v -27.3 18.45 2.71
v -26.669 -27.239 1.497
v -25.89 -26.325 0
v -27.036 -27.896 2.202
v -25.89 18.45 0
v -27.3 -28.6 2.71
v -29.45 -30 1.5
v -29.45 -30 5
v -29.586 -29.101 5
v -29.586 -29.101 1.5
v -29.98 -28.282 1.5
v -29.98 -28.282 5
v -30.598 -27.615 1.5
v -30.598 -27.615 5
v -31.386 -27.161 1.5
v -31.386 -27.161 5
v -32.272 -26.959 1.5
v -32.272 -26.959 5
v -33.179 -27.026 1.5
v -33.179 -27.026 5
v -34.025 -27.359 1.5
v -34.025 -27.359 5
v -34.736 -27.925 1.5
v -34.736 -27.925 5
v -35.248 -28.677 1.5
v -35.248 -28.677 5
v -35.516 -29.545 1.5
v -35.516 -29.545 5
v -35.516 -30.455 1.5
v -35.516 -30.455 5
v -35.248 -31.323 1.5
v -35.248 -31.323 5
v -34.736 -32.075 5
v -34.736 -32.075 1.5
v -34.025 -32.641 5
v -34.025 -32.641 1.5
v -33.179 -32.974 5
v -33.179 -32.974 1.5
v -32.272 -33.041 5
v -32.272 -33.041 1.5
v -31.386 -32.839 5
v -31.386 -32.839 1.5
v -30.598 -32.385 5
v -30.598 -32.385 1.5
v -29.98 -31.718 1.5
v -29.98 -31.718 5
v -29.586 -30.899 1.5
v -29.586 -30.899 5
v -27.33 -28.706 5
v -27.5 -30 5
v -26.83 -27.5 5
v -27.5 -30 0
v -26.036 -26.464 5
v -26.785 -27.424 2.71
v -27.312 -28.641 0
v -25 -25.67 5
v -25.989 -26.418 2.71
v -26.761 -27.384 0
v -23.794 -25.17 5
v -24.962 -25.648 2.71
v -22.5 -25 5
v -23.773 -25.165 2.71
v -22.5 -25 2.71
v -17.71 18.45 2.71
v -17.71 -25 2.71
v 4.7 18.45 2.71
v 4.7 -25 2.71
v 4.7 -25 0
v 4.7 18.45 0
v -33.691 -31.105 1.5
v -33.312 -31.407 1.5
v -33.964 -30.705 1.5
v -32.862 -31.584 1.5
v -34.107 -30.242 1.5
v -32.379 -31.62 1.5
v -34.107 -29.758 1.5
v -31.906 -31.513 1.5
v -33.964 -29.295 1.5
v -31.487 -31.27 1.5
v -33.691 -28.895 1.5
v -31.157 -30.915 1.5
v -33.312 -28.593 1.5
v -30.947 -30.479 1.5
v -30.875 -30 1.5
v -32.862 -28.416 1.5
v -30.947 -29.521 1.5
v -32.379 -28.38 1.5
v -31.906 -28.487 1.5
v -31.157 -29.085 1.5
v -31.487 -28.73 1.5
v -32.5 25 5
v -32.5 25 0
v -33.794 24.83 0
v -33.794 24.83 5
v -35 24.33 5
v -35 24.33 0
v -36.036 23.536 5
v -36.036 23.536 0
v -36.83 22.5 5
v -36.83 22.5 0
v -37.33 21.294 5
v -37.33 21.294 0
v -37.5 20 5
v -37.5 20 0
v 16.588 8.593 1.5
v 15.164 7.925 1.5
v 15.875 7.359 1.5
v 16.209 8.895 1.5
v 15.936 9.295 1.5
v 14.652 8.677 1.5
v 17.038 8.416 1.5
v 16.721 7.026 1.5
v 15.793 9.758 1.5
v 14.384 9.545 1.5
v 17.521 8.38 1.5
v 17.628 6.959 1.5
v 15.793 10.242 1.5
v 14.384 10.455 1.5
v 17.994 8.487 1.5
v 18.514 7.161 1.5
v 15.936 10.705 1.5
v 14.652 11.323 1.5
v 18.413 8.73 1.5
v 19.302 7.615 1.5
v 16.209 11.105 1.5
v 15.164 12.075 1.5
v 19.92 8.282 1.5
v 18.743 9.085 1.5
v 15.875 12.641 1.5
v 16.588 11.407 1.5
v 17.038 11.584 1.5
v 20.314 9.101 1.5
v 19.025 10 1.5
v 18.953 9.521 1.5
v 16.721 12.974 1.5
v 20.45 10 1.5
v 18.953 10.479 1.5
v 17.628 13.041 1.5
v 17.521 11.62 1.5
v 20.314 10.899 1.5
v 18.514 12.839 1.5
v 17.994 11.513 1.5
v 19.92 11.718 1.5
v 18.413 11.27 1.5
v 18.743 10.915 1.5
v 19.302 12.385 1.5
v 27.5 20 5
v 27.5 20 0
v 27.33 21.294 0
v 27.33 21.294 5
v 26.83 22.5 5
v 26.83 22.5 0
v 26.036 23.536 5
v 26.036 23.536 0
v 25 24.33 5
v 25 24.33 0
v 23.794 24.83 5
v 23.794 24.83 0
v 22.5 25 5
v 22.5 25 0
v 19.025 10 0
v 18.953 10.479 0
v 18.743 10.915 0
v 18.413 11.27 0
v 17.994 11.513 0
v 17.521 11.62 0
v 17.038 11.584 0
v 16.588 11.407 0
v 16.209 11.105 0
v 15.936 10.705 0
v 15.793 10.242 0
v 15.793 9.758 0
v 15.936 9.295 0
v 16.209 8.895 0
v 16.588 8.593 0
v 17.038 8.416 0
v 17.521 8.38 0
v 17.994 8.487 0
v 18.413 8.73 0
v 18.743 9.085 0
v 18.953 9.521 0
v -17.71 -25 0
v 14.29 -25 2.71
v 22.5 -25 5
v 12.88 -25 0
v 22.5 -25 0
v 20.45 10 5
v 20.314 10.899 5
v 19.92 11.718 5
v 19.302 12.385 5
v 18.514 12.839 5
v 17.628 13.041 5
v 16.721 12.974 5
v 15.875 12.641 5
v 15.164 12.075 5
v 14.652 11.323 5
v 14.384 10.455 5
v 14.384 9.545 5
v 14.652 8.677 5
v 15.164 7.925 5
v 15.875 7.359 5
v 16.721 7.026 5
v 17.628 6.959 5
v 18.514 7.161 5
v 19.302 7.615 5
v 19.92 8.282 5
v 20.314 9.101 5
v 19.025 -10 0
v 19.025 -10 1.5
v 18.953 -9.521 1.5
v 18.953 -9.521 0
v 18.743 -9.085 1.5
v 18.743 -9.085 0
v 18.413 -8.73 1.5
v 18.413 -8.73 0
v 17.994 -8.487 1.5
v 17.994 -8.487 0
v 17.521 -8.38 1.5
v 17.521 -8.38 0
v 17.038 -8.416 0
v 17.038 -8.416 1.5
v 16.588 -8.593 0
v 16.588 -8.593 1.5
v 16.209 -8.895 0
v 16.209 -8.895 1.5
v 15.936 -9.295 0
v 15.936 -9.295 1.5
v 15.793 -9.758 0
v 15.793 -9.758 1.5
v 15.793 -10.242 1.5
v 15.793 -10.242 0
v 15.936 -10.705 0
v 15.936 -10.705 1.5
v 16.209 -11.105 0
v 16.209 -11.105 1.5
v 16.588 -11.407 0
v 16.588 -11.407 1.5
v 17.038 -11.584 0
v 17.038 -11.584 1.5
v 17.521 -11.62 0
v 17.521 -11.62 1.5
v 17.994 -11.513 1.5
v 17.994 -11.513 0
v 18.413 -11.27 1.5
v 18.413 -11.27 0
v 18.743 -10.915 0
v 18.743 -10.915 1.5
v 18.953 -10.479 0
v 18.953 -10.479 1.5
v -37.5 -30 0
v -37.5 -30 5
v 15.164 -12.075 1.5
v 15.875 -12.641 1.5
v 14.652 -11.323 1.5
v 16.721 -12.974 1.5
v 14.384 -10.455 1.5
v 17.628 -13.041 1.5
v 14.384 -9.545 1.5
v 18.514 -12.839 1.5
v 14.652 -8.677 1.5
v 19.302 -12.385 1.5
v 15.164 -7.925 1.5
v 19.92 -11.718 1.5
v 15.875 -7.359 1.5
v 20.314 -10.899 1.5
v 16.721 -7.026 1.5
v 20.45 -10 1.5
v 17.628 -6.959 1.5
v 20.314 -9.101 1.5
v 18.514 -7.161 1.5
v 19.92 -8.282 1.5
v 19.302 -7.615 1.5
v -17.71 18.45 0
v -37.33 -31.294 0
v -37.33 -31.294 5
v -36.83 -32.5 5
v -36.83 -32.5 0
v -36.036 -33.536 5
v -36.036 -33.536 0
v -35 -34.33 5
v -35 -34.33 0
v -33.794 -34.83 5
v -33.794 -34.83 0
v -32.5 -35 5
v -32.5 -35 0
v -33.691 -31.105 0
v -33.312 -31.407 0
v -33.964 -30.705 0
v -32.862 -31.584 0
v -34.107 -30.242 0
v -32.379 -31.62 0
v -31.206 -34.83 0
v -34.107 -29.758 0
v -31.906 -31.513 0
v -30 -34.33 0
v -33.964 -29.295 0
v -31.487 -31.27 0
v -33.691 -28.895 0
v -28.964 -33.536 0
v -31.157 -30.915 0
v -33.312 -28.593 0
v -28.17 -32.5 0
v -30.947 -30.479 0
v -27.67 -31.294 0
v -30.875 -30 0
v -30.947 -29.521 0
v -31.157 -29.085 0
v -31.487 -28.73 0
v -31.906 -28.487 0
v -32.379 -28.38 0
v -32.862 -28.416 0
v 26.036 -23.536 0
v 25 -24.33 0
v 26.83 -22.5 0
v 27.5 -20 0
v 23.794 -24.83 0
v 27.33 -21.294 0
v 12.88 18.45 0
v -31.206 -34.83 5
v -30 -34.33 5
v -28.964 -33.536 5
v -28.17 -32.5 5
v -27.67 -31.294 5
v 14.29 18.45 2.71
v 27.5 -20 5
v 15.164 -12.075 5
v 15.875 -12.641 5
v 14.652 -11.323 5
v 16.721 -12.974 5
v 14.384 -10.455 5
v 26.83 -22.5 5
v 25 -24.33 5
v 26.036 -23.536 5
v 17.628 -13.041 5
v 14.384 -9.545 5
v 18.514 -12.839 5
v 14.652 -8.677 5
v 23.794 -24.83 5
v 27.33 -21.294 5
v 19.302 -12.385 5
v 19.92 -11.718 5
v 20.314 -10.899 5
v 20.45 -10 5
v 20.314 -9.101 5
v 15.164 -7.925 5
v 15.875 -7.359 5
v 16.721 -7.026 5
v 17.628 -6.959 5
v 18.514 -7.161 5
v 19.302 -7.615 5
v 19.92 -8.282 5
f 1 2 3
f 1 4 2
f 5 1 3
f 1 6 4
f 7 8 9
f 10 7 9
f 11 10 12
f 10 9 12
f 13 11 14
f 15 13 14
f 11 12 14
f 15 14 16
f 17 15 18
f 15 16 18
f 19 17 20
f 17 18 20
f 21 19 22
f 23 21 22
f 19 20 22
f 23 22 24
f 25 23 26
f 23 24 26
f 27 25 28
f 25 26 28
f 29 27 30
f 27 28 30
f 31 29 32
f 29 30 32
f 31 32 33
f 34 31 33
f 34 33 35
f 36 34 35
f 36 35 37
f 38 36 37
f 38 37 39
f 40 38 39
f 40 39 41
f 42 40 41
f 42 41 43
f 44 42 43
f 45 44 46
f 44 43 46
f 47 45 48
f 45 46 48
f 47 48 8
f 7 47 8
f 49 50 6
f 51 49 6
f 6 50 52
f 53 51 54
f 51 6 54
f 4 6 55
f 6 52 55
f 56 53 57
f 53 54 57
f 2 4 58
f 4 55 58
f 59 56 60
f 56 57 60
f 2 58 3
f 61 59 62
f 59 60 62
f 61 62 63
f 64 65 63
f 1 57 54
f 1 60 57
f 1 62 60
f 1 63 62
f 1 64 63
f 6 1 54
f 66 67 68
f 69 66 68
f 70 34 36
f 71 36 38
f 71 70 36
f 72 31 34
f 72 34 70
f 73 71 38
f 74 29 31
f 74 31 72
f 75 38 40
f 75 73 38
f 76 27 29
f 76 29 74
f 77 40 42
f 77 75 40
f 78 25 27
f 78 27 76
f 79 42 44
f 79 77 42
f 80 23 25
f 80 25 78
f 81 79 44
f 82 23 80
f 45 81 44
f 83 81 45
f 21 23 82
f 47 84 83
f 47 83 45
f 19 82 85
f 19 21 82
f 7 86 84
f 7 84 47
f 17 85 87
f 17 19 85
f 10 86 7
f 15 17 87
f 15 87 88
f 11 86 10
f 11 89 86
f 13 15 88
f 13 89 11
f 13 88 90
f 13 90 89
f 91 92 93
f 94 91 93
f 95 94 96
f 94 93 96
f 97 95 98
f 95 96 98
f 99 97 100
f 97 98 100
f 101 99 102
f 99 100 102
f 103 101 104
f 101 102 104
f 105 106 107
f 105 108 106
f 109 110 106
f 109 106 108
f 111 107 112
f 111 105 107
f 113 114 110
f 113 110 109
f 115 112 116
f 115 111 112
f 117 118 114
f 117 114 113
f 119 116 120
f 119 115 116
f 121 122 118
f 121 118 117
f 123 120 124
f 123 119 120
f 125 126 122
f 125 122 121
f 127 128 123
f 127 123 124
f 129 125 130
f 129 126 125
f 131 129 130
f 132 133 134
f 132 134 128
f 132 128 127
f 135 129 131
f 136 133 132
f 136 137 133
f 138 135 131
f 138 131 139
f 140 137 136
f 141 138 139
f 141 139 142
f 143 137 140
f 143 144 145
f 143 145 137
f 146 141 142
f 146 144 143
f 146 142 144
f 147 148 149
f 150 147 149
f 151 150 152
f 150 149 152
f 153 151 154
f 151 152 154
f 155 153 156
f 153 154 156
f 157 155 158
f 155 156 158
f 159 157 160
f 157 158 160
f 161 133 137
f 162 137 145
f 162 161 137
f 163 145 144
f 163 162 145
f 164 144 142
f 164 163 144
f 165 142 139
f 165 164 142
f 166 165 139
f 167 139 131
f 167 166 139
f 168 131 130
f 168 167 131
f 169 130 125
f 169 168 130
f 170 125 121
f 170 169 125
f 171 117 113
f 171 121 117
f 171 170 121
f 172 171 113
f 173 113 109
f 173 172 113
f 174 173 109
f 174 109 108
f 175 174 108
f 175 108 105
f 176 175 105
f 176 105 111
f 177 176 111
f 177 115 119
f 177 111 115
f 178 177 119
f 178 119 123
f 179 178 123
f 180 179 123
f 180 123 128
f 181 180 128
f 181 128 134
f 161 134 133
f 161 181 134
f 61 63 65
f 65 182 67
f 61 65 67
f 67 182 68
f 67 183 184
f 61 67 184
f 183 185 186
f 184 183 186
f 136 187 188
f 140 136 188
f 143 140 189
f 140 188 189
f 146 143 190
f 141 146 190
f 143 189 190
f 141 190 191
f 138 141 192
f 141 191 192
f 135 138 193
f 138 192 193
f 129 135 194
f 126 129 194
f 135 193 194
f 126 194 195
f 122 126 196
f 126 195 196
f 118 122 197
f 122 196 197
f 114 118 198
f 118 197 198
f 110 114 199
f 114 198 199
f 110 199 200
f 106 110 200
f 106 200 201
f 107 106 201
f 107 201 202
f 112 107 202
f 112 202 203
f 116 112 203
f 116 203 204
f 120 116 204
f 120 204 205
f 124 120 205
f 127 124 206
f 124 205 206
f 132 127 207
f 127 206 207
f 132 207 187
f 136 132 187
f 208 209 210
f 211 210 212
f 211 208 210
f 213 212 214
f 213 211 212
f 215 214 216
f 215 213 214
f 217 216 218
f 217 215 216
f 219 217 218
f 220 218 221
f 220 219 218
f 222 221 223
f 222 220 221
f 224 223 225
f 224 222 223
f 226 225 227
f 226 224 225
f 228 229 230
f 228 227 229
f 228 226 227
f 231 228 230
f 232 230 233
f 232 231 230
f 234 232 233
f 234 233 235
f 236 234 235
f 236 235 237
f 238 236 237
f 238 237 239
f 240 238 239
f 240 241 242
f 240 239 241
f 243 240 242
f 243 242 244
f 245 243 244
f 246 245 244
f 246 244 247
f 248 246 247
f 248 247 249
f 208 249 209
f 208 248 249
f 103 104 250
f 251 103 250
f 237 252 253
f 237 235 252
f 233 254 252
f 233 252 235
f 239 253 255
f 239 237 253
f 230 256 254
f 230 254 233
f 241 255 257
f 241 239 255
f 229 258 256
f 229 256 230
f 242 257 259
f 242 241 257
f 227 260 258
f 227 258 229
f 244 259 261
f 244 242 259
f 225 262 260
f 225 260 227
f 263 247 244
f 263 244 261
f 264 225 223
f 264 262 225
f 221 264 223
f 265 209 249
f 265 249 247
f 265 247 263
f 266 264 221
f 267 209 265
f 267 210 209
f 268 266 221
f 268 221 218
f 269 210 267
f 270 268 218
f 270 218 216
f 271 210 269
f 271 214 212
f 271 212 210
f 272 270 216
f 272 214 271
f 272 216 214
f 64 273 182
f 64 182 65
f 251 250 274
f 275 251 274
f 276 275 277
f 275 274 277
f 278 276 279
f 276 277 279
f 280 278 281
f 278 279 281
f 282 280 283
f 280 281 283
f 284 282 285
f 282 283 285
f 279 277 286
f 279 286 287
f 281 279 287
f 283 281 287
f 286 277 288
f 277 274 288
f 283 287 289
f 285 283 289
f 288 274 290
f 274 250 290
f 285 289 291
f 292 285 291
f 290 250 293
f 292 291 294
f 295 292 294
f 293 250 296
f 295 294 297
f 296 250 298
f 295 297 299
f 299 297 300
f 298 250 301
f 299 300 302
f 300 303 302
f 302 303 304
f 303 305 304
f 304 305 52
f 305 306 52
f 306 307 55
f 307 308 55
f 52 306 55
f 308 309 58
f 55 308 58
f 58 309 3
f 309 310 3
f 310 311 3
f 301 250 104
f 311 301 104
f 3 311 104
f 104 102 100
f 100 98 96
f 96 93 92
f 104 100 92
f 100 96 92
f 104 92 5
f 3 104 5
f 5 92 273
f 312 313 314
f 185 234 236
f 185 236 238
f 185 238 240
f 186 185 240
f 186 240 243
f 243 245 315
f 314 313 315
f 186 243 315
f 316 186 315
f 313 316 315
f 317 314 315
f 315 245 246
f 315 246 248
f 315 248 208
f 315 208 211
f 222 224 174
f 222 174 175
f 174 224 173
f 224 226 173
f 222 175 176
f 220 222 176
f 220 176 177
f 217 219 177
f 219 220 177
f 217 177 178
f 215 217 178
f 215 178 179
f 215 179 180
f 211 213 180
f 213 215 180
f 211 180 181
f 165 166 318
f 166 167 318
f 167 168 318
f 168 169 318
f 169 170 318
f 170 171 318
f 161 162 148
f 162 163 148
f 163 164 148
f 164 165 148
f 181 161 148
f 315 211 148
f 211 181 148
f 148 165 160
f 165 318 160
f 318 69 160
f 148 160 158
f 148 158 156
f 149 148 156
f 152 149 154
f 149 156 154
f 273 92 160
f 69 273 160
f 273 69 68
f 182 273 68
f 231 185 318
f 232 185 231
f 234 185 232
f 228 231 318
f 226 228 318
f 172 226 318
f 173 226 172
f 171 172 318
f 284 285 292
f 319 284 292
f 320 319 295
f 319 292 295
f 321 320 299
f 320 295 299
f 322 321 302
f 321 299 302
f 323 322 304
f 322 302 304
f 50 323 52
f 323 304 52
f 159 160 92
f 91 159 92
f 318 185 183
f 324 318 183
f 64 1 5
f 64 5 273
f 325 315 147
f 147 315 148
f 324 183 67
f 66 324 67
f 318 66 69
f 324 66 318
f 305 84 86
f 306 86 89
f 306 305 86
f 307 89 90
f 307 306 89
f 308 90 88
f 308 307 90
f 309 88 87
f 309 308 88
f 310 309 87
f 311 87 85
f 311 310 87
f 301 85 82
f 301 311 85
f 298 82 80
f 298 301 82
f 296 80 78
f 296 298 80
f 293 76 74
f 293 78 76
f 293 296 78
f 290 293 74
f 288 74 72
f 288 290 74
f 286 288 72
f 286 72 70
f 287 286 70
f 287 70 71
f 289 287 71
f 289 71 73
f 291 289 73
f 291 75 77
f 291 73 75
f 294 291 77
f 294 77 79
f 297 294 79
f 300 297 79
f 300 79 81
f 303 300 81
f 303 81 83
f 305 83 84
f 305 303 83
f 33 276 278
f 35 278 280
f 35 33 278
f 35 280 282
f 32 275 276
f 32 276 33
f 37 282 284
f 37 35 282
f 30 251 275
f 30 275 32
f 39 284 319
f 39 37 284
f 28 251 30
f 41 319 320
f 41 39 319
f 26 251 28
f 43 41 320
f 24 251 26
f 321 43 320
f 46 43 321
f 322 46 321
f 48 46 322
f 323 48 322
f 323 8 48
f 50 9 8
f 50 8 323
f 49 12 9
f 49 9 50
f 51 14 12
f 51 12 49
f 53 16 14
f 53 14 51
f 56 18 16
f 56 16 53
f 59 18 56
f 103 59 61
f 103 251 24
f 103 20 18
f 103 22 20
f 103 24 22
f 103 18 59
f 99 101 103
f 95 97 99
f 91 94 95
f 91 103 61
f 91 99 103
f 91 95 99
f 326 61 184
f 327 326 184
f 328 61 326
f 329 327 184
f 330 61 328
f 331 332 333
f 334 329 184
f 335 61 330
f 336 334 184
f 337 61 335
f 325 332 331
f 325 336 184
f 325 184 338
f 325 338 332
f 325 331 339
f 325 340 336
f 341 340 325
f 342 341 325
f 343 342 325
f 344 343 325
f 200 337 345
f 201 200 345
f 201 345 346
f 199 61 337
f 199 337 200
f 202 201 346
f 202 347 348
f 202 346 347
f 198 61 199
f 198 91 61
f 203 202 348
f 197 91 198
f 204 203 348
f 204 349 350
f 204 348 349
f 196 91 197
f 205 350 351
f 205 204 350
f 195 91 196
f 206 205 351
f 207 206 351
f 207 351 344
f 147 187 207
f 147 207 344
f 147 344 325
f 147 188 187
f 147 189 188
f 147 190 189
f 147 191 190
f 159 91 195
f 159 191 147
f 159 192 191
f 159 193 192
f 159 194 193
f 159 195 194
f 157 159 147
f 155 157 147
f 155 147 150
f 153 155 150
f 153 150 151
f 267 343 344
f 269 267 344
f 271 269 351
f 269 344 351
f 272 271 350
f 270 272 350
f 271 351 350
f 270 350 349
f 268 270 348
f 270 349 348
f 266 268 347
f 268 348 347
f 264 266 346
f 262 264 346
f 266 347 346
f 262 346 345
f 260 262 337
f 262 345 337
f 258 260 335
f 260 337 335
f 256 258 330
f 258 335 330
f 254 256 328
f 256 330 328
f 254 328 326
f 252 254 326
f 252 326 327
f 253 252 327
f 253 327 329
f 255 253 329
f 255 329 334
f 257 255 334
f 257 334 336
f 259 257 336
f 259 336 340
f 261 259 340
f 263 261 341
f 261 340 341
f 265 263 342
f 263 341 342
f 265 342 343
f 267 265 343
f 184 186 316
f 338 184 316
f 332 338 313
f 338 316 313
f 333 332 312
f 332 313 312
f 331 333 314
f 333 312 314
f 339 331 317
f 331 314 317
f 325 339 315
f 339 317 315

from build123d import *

# Parameters (mm, degrees)
F0_R     = 1.625
F1_DEPTH = 5
F2_R     = 3.05
F3_DEPTH = 3.5
F4_W     = 4.79
F4_H     = 2.71
F5_DEPTH = 43.45


with BuildPart() as f1:
    # F0 (on Top) → F1 (new body)
    with BuildSketch(Plane.XY):
        with BuildLine():
            Line((22.5, 25), (-32.5, 25))
            ThreePointArc((-32.5, 25), (-36.035534, 23.535534), (-37.5, 20))
            Line((-37.5, 20), (-37.5, -30))
            ThreePointArc((-37.5, -30), (-36.035534, -33.535534), (-32.5, -35))
            ThreePointArc((-32.5, -35), (-28.964466, -33.535534), (-27.5, -30))
            ThreePointArc((-27.5, -30), (-26.035534, -26.464466), (-22.5, -25))
            Line((-22.5, -25), (22.5, -25))
            ThreePointArc((22.5, -25), (26.035534, -23.535534), (27.5, -20))
            Line((27.5, -20), (27.5, 20))
            ThreePointArc((27.5, 20), (26.035534, 23.535534), (22.5, 25))
        make_face()
        with Locations((-32.5, -30)):
            Circle(F0_R, mode=Mode.SUBTRACT)
        with Locations((17.4, -10)):
            Circle(F0_R, mode=Mode.SUBTRACT)
        with Locations((17.4, 10)):
            Circle(F0_R, mode=Mode.SUBTRACT)
    extrude(amount=F1_DEPTH)

    # F2 (on face) → F3 (cut)
    with BuildSketch(Plane.XY.offset(5)):
        with Locations((17.4, 10)):
            Circle(F2_R)
        with Locations((17.4, -10)):
            Circle(F2_R)
        with Locations((-32.5, -30)):
            Circle(F2_R)
    extrude(amount=-F3_DEPTH, mode=Mode.SUBTRACT)

    # F4 (on face) → F5 (cut, symmetric)
    with BuildSketch(Plane.XZ.offset(25)):
        with Locations((-20.105, 1.355)):
            Rectangle(F4_W, F4_H)
        Polygon((4.7, 2.71), (4.7, 0), (12.88, 0), (14.29, 2.71), align=None)
        Polygon((-25.89, 0), (-22.5, 0), (-22.5, 2.71), (-27.3, 2.71), align=None)
    extrude(amount=F5_DEPTH, both=True, mode=Mode.SUBTRACT)


solid = f1.part
